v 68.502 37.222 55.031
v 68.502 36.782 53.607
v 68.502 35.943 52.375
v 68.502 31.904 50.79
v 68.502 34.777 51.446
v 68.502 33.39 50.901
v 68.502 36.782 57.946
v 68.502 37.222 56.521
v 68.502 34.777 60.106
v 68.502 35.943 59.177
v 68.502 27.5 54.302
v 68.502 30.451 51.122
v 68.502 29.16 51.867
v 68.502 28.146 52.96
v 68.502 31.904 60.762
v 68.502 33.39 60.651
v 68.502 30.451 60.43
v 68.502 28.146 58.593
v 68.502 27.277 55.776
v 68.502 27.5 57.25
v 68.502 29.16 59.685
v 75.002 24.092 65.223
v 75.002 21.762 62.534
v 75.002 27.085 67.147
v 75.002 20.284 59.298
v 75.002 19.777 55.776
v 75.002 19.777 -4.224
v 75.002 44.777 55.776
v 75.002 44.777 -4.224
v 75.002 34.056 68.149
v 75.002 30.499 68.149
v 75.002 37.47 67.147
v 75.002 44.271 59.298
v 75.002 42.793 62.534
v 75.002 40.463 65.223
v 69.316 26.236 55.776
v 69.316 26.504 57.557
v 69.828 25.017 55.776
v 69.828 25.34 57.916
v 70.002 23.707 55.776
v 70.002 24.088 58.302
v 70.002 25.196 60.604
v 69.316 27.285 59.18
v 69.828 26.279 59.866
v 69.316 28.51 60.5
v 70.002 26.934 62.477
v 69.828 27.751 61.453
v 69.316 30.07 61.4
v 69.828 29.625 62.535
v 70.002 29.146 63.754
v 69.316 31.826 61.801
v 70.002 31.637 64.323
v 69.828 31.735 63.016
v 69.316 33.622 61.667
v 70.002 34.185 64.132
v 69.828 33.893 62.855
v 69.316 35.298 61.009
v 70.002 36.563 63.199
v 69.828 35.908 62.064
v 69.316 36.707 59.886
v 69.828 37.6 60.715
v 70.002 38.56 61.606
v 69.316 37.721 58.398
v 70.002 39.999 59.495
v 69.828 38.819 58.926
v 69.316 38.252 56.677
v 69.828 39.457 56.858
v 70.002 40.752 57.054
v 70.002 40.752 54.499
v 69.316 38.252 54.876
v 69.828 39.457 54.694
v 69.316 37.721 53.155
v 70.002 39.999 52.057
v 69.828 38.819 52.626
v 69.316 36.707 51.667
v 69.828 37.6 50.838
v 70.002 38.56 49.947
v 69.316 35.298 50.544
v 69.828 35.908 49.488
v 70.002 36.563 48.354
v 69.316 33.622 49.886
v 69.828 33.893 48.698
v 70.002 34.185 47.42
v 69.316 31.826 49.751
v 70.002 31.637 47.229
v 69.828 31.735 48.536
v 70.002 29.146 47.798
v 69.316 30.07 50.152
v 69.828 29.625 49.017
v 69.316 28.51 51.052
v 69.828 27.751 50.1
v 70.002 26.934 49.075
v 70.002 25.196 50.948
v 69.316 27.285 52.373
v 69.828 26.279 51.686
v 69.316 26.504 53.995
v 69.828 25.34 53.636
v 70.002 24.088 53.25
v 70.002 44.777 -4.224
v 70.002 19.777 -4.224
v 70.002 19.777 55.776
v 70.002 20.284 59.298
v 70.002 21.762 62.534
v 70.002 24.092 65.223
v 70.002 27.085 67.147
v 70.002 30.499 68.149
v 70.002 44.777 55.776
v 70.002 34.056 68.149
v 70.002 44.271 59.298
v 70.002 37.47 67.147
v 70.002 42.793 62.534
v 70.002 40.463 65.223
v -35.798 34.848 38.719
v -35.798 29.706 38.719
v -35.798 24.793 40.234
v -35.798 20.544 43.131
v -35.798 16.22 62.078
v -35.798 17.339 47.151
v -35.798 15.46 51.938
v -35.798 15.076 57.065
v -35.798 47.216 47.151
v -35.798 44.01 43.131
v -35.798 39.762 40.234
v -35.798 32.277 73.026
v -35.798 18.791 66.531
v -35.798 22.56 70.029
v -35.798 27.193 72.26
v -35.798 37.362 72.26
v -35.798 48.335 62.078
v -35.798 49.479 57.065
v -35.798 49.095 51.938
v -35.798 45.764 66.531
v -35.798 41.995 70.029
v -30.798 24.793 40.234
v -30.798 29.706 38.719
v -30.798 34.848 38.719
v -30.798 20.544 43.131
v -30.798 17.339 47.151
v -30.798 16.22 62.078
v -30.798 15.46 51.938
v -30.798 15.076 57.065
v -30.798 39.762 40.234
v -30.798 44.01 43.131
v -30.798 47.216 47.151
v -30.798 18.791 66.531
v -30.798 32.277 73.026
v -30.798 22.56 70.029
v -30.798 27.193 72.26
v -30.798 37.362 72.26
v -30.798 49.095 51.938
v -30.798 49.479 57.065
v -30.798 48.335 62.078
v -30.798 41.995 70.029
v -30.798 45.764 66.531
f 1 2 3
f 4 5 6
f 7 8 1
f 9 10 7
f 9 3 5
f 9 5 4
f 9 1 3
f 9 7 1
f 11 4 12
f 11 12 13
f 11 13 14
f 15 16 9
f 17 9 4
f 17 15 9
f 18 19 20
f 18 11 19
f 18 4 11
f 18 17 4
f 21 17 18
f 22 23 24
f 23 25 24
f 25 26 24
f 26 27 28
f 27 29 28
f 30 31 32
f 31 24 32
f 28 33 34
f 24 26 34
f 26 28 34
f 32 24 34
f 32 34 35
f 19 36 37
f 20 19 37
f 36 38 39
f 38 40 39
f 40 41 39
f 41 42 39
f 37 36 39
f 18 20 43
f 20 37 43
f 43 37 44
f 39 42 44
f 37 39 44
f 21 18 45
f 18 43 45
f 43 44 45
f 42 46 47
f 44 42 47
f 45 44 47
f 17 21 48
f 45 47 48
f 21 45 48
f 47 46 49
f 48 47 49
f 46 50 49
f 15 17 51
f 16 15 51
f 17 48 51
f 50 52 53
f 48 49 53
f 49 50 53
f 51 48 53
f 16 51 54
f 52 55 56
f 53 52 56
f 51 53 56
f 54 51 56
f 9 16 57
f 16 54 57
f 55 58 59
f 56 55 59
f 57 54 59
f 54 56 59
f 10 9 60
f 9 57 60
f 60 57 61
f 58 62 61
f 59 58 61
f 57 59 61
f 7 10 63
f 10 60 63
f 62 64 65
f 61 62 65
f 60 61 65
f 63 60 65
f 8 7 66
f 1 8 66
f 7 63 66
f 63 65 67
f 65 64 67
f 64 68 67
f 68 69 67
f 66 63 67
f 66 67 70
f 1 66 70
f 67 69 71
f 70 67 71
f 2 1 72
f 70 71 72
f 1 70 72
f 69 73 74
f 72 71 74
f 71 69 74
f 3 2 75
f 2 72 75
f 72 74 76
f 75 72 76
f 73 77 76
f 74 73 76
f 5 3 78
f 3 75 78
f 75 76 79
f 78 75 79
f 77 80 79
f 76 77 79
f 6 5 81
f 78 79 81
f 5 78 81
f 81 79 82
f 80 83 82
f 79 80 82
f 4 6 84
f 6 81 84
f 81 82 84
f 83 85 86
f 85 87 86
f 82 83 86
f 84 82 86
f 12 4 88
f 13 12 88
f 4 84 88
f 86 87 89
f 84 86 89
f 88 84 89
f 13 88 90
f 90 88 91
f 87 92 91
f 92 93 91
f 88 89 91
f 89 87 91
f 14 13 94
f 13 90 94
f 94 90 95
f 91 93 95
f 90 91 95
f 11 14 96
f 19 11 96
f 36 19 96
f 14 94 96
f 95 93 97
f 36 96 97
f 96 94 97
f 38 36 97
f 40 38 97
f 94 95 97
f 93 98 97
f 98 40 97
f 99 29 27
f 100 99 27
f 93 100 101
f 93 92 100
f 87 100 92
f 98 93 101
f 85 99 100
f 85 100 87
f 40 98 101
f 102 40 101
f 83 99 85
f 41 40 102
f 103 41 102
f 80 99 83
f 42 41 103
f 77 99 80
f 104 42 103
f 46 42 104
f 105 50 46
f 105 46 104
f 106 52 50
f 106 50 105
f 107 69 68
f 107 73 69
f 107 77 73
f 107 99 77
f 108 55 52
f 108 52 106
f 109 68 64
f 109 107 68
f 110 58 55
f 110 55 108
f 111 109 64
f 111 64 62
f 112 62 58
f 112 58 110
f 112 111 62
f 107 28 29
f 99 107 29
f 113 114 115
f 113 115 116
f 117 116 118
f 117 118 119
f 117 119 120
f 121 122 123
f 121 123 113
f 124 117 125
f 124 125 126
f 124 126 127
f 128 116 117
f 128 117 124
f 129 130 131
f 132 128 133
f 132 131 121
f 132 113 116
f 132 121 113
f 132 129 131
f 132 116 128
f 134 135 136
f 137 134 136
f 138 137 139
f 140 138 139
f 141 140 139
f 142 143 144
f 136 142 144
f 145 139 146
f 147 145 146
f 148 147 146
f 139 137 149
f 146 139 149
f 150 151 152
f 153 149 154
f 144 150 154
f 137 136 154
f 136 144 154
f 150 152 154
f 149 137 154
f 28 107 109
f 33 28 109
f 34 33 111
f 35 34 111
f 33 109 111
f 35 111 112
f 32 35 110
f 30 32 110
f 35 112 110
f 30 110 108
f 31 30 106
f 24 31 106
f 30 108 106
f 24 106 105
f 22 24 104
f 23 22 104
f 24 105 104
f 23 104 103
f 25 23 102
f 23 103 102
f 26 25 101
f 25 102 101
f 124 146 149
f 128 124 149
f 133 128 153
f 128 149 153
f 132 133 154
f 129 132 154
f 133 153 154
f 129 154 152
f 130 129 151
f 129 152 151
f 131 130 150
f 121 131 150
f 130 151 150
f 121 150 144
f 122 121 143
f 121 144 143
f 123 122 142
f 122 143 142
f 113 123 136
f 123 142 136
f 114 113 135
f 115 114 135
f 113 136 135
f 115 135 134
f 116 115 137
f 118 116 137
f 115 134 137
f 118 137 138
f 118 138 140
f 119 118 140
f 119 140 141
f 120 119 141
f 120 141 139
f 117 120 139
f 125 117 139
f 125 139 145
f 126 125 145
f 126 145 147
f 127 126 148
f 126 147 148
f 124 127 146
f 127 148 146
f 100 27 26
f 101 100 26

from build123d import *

# Parameters (mm, degrees)
SKETCH1_R                                    = 17.25
MOTOR_PLATE_DEPTH                            = 5
SKETCH2_R                                    = 12.5
BEARING_SIDE_DEPTH                           = 5
SKETCH3_R                                    = 5
BEARING_NUB_ONLY_CONTACTS_INNER_HUB_OF_DEPTH = 1.5
BEARING_NUB_FILLET_5MM_R                     = 5
BOSS_EXTRUDE4_DEPTH                          = 5


with BuildPart() as part:
    # Sketch1 → Motor plate (new body)
    with BuildSketch(Plane.ZY.offset(30.797658267)):
        with Locations((55.776129099, 32.277474859)):
            Circle(SKETCH1_R)
    extrude(amount=MOTOR_PLATE_DEPTH)


with BuildPart() as body_2:
    # Sketch2 → Bearing side (new body)
    with BuildSketch(Plane(origin=(70.002341733, 0, 0), x_dir=(0, 0, -1), z_dir=(1, 0, 0))):
        with Locations(Location((-55.776129099, 32.277474859, 0), (0, 0, 90))):
            Circle(SKETCH2_R)
    extrude(amount=BEARING_SIDE_DEPTH)

    # Sketch3 → Bearing nub (only contacts inner hub of bearing) (add)
    with BuildSketch(Plane.ZY.offset(-70.002341733)):
        with Locations(Location((55.776129099, 32.277474859, 0), (0, 0, 270))):
            Circle(SKETCH3_R)
    extrude(amount=BEARING_NUB_ONLY_CONTACTS_INNER_HUB_OF_DEPTH)

    # Bearing nub fillet 5mm
    # the kernel refuses this fillet: 5 mm, written as the material it adds along each edge
    with BuildSketch(Plane(origin=(70.002341733, 32.277474859, 55.776129099), x_dir=(0, -1, 0), z_dir=(0, 0, -1))) as bearing_nub_fillet_5mm_piece_1:
        with BuildLine():
            CenterArc((8.570714214, 5), BEARING_NUB_FILLET_5MM_R, 224.427004001, 45.572995999)
            Line((5, 1.5), (4.928585716, 1.43))
            ThreePointArc((4.928585716, 1.43), (4.9, 0.75), (4.9, 0))
            Line((4.9, 0), (5, -0.1))
            Line((5, -0.1), (8.570714214, -0.1))
            Line((8.570714214, -0.1), (8.570714214, 0))
        make_face()
    revolve(axis=Axis((70.002341733, 32.277474859, 55.776129099), (-1, 0, 0)))

    # Sketch4 → Boss-Extrude4 (add)
    with BuildSketch(Plane(origin=(75.002341733, 0, 0), x_dir=(0, 0, -1), z_dir=(1, 0, 0))):
        with BuildLine():
            Line((-55.776129099, 44.777474859), (4.223870901, 44.777474859))
            Line((4.223870901, 44.777474859), (4.223870901, 19.777474859))
            Line((4.223870901, 19.777474859), (-55.776129099, 19.777474859))
            ThreePointArc((-55.776129099, 19.777474859), (-68.276129099, 32.277474859), (-55.776129099, 44.777474859))
        make_face()
    extrude(amount=-BOSS_EXTRUDE4_DEPTH)


solid = Compound([part.part, body_2.part])
